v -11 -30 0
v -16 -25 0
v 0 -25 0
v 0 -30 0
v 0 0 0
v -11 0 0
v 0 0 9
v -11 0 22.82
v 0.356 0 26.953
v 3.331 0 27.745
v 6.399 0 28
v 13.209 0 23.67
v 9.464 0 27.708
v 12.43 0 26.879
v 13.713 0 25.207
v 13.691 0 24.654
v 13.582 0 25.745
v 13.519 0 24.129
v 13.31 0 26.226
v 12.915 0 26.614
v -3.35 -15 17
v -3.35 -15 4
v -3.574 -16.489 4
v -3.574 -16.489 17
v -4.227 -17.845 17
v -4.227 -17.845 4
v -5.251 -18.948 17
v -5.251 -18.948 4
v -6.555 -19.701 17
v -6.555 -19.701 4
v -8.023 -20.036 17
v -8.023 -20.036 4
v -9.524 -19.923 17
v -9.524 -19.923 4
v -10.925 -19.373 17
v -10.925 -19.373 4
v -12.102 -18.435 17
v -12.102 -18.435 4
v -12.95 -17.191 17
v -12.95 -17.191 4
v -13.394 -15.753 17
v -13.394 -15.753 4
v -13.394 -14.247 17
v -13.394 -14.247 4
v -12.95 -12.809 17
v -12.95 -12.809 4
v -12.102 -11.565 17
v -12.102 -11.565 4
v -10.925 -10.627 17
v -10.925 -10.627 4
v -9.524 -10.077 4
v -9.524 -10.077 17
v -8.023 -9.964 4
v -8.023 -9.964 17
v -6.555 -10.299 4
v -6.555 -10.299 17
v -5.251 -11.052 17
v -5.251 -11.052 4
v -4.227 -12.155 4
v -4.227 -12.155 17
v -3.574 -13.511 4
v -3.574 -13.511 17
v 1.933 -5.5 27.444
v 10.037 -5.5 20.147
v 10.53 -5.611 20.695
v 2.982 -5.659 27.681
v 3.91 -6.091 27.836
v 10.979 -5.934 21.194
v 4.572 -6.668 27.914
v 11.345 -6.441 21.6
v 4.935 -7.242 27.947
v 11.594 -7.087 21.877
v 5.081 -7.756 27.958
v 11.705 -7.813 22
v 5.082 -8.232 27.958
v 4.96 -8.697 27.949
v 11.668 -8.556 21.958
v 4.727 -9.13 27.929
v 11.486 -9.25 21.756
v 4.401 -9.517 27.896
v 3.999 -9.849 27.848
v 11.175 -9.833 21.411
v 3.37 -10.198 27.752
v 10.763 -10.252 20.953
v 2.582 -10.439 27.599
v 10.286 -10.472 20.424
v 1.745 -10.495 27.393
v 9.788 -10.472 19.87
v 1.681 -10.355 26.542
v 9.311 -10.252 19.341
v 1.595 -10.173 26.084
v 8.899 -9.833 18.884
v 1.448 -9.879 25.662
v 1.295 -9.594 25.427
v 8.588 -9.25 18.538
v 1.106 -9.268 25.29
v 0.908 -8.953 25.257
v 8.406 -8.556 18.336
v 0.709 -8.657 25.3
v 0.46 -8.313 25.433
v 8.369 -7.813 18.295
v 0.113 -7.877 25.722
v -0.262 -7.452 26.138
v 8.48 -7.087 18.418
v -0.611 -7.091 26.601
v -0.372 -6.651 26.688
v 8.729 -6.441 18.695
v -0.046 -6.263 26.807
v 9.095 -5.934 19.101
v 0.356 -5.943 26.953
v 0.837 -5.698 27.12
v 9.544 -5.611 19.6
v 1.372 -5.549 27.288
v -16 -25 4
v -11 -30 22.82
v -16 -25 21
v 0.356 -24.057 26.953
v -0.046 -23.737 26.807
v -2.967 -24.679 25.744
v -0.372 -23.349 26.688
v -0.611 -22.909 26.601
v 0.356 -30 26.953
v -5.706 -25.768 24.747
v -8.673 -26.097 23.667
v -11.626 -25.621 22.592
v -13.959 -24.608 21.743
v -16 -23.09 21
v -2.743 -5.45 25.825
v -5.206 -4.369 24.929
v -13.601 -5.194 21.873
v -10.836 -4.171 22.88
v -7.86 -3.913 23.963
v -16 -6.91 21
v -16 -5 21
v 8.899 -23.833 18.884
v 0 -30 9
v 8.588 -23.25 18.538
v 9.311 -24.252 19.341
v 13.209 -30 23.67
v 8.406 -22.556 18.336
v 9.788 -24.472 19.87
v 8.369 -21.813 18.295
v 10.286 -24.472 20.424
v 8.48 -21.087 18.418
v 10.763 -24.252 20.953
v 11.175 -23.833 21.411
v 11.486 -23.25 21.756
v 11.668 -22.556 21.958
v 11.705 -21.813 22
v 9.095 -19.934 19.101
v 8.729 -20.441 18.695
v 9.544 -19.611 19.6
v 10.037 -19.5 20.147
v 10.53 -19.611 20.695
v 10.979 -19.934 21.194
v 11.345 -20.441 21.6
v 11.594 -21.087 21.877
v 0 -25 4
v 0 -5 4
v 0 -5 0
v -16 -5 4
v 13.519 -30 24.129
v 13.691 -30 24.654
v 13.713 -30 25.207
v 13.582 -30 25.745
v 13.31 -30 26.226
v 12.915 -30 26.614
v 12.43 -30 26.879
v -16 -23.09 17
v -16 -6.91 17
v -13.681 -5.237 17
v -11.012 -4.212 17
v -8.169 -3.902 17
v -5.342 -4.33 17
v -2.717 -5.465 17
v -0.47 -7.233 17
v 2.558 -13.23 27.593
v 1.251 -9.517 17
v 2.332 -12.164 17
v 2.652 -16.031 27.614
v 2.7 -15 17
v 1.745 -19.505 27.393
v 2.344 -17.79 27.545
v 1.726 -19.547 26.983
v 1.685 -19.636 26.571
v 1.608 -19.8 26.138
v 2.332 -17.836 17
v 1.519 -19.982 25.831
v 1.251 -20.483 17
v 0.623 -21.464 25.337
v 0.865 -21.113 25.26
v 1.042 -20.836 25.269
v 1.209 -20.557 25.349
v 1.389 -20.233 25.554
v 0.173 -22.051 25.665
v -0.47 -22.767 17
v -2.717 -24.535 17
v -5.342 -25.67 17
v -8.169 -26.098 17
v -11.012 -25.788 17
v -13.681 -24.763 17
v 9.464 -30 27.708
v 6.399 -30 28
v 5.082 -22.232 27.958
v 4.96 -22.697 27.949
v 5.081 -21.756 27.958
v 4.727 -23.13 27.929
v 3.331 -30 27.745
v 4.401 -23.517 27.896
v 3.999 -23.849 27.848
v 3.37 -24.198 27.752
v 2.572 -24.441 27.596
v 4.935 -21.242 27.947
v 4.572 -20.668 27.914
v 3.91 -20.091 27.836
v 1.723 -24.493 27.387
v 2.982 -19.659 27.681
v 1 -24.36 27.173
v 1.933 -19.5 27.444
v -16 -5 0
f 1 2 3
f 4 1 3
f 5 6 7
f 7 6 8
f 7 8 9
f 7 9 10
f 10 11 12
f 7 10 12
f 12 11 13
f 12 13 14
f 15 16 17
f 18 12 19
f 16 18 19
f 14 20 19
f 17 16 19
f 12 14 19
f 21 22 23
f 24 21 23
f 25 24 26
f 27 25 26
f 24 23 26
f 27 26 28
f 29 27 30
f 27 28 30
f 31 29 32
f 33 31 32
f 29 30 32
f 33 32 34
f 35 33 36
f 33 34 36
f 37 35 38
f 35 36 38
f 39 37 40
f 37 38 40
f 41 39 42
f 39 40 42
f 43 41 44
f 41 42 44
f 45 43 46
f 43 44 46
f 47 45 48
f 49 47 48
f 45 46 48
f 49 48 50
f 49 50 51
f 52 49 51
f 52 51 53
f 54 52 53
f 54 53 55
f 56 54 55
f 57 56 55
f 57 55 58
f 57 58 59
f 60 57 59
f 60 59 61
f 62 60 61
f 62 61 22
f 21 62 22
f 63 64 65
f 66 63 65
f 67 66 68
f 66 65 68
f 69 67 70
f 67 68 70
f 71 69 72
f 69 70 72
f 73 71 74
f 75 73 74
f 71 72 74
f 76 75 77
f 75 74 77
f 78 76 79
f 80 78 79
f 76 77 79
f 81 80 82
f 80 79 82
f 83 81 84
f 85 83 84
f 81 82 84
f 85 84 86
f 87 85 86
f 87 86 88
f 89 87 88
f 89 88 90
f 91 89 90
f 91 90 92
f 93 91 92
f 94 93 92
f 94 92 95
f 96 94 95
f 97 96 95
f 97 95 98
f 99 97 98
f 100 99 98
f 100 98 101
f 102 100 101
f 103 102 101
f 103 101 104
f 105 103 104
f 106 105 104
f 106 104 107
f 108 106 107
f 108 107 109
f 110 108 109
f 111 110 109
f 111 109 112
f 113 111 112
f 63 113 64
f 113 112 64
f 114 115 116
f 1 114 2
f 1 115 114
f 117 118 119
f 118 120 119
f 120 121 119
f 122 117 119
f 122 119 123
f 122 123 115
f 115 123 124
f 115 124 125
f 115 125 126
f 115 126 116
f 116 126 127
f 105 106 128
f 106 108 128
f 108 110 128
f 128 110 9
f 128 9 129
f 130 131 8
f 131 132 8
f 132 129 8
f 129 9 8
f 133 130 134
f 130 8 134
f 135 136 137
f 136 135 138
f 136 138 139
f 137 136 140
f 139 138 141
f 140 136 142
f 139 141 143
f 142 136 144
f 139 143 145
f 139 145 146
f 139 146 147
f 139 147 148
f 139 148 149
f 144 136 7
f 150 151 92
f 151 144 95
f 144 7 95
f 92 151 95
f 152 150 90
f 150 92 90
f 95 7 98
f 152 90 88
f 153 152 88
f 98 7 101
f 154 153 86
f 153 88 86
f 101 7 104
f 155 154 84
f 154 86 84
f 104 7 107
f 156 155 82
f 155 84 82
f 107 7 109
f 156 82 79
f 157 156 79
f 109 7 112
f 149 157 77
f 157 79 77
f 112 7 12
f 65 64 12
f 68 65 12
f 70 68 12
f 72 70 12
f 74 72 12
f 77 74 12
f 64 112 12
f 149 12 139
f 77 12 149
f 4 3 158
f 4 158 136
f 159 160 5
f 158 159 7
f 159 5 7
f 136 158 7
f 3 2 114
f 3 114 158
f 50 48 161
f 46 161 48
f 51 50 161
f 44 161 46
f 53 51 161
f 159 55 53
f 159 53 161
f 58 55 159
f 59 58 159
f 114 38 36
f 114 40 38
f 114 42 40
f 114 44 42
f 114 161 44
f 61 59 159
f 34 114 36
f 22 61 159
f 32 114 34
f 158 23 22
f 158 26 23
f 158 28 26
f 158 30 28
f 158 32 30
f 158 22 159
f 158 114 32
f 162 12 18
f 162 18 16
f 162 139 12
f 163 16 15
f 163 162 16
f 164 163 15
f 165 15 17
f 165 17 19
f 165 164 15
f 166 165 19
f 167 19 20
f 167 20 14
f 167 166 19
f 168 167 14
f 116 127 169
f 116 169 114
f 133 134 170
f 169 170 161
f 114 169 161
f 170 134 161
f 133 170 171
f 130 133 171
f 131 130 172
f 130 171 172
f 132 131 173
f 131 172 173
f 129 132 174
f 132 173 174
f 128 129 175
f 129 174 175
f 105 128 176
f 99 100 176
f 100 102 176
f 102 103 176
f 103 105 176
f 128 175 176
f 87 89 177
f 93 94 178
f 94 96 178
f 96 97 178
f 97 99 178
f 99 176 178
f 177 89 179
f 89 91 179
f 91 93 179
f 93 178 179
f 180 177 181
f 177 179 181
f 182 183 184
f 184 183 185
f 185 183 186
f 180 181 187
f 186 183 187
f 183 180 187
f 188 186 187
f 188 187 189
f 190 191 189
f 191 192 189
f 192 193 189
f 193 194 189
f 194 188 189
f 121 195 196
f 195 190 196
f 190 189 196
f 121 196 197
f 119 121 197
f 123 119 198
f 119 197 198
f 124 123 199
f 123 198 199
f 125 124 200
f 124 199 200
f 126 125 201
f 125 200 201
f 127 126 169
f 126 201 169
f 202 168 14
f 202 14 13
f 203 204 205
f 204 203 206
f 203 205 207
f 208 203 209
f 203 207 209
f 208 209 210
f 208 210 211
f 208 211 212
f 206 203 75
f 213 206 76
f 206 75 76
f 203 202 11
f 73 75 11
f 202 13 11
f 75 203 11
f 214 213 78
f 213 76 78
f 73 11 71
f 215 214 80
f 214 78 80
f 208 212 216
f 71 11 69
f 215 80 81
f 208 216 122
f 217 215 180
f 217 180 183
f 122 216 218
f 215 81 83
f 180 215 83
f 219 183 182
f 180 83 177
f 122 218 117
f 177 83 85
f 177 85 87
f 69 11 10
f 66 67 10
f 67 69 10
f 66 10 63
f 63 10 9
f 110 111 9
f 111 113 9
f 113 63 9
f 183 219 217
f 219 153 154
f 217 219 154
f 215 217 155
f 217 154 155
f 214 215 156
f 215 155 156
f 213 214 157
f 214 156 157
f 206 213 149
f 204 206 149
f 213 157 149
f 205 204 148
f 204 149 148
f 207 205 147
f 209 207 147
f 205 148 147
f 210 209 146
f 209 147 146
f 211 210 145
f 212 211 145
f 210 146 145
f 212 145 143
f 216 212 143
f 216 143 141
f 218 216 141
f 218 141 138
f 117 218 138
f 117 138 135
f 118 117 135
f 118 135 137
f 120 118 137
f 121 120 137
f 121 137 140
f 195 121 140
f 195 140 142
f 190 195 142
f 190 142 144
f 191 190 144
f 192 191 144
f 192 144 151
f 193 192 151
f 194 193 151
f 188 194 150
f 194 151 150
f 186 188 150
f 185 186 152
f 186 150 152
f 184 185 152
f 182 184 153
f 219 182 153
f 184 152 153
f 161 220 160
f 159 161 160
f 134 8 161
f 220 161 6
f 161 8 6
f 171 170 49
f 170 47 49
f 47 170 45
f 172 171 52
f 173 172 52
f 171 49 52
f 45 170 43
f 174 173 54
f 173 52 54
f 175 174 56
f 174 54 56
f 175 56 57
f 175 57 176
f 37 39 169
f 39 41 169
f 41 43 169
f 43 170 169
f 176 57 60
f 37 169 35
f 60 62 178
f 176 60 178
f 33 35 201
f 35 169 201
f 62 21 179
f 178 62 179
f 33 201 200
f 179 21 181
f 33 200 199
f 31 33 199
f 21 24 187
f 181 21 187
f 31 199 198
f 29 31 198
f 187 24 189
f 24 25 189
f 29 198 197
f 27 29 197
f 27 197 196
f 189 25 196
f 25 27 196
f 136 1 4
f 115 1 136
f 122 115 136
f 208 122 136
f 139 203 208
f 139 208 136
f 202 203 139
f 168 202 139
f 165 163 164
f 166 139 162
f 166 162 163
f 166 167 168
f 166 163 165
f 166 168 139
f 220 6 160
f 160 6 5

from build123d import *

# Parameters (mm, degrees)
F1_DEPTH  = 30
F2_R      = 5.05
F3_DEPTH  = 28.001
F4_W      = 16
F4_H      = 20
F4_R      = 5.05
F5_DEPTH  = 4
F7_R      = 11.1
F8_DEPTH  = 11.001
F9_SIZE   = 5
F10_R     = 2
F11_R     = 2.5
F12_DEPTH = 24.6047988697


with BuildPart() as f1:
    # F0 (on Front) → F1 (new body)
    with BuildSketch(Plane.XZ):
        with BuildLine():
            Line((-16, 0), (0, 0))
            Line((0, 0), (0, 9))
            Line((0, 9), (15, 25.6591877224))
            ThreePointArc((15, 25.6591877224), (7.8215314679, 27.9326389309), (0.3556593903, 26.9529731799))
            Line((0.3556593903, 26.9529731799), (-16, 21))
            Line((-16, 21), (-16, 0))
        make_face()
    extrude(amount=F1_DEPTH)

    # F2 (on face) → F3 (cut, through all)
    with BuildSketch(Plane(origin=(0, 0, 0), x_dir=(1, 0, 0), z_dir=(0, 0, -1))):
        with Locations((-8.4, 15)):
            Circle(F2_R)
    extrude(amount=-F3_DEPTH, mode=Mode.SUBTRACT)

    # F4 (on face) → F5 (cut)
    with BuildSketch(Plane(origin=(0, 0, 0), x_dir=(1, 0, 0), z_dir=(0, 0, -1))):
        with Locations((-8, 15)):
            Rectangle(F4_W, F4_H)
        with Locations((-8.4, 15)):
            Circle(F4_R, mode=Mode.SUBTRACT)
    extrude(amount=-F5_DEPTH, mode=Mode.SUBTRACT)

    # F7 (on offset) → F8 (cut, through all)
    with BuildSketch(Plane(origin=(0, 0, 17), x_dir=(1, 0, 0), z_dir=(0, 0, -1))):
        with Locations((-8.4, 15)):
            Circle(F7_R)
    extrude(amount=-F8_DEPTH, mode=Mode.SUBTRACT)

    # F9
    f9_edges = [f1.edges().sort_by_distance(p)[0] for p in [
        (-16, -30, 10.5),
        (-16, 0, 10.5),
    ]]
    chamfer(f9_edges, length=F9_SIZE)

    # F10
    f10_edges = [f1.edges().sort_by_distance(p)[0] for p in [
        (15, -15, 25.659188),
    ]]
    fillet(f10_edges, radius=F10_R)

    # F11 (on face) → F12 (cut, through all)
    with BuildSketch(Plane(origin=(-4.4753485292, 0, 4.0296219153), x_dir=(0, 1, 0), z_dir=(0.7431448255, 0, -0.6691306064))):
        with Locations((-22, 21.6883034293)):
            Circle(F11_R)
        with Locations((-8, 21.6883034293)):
            Circle(F11_R)
    extrude(amount=-F12_DEPTH, mode=Mode.SUBTRACT)


solid = f1.part
